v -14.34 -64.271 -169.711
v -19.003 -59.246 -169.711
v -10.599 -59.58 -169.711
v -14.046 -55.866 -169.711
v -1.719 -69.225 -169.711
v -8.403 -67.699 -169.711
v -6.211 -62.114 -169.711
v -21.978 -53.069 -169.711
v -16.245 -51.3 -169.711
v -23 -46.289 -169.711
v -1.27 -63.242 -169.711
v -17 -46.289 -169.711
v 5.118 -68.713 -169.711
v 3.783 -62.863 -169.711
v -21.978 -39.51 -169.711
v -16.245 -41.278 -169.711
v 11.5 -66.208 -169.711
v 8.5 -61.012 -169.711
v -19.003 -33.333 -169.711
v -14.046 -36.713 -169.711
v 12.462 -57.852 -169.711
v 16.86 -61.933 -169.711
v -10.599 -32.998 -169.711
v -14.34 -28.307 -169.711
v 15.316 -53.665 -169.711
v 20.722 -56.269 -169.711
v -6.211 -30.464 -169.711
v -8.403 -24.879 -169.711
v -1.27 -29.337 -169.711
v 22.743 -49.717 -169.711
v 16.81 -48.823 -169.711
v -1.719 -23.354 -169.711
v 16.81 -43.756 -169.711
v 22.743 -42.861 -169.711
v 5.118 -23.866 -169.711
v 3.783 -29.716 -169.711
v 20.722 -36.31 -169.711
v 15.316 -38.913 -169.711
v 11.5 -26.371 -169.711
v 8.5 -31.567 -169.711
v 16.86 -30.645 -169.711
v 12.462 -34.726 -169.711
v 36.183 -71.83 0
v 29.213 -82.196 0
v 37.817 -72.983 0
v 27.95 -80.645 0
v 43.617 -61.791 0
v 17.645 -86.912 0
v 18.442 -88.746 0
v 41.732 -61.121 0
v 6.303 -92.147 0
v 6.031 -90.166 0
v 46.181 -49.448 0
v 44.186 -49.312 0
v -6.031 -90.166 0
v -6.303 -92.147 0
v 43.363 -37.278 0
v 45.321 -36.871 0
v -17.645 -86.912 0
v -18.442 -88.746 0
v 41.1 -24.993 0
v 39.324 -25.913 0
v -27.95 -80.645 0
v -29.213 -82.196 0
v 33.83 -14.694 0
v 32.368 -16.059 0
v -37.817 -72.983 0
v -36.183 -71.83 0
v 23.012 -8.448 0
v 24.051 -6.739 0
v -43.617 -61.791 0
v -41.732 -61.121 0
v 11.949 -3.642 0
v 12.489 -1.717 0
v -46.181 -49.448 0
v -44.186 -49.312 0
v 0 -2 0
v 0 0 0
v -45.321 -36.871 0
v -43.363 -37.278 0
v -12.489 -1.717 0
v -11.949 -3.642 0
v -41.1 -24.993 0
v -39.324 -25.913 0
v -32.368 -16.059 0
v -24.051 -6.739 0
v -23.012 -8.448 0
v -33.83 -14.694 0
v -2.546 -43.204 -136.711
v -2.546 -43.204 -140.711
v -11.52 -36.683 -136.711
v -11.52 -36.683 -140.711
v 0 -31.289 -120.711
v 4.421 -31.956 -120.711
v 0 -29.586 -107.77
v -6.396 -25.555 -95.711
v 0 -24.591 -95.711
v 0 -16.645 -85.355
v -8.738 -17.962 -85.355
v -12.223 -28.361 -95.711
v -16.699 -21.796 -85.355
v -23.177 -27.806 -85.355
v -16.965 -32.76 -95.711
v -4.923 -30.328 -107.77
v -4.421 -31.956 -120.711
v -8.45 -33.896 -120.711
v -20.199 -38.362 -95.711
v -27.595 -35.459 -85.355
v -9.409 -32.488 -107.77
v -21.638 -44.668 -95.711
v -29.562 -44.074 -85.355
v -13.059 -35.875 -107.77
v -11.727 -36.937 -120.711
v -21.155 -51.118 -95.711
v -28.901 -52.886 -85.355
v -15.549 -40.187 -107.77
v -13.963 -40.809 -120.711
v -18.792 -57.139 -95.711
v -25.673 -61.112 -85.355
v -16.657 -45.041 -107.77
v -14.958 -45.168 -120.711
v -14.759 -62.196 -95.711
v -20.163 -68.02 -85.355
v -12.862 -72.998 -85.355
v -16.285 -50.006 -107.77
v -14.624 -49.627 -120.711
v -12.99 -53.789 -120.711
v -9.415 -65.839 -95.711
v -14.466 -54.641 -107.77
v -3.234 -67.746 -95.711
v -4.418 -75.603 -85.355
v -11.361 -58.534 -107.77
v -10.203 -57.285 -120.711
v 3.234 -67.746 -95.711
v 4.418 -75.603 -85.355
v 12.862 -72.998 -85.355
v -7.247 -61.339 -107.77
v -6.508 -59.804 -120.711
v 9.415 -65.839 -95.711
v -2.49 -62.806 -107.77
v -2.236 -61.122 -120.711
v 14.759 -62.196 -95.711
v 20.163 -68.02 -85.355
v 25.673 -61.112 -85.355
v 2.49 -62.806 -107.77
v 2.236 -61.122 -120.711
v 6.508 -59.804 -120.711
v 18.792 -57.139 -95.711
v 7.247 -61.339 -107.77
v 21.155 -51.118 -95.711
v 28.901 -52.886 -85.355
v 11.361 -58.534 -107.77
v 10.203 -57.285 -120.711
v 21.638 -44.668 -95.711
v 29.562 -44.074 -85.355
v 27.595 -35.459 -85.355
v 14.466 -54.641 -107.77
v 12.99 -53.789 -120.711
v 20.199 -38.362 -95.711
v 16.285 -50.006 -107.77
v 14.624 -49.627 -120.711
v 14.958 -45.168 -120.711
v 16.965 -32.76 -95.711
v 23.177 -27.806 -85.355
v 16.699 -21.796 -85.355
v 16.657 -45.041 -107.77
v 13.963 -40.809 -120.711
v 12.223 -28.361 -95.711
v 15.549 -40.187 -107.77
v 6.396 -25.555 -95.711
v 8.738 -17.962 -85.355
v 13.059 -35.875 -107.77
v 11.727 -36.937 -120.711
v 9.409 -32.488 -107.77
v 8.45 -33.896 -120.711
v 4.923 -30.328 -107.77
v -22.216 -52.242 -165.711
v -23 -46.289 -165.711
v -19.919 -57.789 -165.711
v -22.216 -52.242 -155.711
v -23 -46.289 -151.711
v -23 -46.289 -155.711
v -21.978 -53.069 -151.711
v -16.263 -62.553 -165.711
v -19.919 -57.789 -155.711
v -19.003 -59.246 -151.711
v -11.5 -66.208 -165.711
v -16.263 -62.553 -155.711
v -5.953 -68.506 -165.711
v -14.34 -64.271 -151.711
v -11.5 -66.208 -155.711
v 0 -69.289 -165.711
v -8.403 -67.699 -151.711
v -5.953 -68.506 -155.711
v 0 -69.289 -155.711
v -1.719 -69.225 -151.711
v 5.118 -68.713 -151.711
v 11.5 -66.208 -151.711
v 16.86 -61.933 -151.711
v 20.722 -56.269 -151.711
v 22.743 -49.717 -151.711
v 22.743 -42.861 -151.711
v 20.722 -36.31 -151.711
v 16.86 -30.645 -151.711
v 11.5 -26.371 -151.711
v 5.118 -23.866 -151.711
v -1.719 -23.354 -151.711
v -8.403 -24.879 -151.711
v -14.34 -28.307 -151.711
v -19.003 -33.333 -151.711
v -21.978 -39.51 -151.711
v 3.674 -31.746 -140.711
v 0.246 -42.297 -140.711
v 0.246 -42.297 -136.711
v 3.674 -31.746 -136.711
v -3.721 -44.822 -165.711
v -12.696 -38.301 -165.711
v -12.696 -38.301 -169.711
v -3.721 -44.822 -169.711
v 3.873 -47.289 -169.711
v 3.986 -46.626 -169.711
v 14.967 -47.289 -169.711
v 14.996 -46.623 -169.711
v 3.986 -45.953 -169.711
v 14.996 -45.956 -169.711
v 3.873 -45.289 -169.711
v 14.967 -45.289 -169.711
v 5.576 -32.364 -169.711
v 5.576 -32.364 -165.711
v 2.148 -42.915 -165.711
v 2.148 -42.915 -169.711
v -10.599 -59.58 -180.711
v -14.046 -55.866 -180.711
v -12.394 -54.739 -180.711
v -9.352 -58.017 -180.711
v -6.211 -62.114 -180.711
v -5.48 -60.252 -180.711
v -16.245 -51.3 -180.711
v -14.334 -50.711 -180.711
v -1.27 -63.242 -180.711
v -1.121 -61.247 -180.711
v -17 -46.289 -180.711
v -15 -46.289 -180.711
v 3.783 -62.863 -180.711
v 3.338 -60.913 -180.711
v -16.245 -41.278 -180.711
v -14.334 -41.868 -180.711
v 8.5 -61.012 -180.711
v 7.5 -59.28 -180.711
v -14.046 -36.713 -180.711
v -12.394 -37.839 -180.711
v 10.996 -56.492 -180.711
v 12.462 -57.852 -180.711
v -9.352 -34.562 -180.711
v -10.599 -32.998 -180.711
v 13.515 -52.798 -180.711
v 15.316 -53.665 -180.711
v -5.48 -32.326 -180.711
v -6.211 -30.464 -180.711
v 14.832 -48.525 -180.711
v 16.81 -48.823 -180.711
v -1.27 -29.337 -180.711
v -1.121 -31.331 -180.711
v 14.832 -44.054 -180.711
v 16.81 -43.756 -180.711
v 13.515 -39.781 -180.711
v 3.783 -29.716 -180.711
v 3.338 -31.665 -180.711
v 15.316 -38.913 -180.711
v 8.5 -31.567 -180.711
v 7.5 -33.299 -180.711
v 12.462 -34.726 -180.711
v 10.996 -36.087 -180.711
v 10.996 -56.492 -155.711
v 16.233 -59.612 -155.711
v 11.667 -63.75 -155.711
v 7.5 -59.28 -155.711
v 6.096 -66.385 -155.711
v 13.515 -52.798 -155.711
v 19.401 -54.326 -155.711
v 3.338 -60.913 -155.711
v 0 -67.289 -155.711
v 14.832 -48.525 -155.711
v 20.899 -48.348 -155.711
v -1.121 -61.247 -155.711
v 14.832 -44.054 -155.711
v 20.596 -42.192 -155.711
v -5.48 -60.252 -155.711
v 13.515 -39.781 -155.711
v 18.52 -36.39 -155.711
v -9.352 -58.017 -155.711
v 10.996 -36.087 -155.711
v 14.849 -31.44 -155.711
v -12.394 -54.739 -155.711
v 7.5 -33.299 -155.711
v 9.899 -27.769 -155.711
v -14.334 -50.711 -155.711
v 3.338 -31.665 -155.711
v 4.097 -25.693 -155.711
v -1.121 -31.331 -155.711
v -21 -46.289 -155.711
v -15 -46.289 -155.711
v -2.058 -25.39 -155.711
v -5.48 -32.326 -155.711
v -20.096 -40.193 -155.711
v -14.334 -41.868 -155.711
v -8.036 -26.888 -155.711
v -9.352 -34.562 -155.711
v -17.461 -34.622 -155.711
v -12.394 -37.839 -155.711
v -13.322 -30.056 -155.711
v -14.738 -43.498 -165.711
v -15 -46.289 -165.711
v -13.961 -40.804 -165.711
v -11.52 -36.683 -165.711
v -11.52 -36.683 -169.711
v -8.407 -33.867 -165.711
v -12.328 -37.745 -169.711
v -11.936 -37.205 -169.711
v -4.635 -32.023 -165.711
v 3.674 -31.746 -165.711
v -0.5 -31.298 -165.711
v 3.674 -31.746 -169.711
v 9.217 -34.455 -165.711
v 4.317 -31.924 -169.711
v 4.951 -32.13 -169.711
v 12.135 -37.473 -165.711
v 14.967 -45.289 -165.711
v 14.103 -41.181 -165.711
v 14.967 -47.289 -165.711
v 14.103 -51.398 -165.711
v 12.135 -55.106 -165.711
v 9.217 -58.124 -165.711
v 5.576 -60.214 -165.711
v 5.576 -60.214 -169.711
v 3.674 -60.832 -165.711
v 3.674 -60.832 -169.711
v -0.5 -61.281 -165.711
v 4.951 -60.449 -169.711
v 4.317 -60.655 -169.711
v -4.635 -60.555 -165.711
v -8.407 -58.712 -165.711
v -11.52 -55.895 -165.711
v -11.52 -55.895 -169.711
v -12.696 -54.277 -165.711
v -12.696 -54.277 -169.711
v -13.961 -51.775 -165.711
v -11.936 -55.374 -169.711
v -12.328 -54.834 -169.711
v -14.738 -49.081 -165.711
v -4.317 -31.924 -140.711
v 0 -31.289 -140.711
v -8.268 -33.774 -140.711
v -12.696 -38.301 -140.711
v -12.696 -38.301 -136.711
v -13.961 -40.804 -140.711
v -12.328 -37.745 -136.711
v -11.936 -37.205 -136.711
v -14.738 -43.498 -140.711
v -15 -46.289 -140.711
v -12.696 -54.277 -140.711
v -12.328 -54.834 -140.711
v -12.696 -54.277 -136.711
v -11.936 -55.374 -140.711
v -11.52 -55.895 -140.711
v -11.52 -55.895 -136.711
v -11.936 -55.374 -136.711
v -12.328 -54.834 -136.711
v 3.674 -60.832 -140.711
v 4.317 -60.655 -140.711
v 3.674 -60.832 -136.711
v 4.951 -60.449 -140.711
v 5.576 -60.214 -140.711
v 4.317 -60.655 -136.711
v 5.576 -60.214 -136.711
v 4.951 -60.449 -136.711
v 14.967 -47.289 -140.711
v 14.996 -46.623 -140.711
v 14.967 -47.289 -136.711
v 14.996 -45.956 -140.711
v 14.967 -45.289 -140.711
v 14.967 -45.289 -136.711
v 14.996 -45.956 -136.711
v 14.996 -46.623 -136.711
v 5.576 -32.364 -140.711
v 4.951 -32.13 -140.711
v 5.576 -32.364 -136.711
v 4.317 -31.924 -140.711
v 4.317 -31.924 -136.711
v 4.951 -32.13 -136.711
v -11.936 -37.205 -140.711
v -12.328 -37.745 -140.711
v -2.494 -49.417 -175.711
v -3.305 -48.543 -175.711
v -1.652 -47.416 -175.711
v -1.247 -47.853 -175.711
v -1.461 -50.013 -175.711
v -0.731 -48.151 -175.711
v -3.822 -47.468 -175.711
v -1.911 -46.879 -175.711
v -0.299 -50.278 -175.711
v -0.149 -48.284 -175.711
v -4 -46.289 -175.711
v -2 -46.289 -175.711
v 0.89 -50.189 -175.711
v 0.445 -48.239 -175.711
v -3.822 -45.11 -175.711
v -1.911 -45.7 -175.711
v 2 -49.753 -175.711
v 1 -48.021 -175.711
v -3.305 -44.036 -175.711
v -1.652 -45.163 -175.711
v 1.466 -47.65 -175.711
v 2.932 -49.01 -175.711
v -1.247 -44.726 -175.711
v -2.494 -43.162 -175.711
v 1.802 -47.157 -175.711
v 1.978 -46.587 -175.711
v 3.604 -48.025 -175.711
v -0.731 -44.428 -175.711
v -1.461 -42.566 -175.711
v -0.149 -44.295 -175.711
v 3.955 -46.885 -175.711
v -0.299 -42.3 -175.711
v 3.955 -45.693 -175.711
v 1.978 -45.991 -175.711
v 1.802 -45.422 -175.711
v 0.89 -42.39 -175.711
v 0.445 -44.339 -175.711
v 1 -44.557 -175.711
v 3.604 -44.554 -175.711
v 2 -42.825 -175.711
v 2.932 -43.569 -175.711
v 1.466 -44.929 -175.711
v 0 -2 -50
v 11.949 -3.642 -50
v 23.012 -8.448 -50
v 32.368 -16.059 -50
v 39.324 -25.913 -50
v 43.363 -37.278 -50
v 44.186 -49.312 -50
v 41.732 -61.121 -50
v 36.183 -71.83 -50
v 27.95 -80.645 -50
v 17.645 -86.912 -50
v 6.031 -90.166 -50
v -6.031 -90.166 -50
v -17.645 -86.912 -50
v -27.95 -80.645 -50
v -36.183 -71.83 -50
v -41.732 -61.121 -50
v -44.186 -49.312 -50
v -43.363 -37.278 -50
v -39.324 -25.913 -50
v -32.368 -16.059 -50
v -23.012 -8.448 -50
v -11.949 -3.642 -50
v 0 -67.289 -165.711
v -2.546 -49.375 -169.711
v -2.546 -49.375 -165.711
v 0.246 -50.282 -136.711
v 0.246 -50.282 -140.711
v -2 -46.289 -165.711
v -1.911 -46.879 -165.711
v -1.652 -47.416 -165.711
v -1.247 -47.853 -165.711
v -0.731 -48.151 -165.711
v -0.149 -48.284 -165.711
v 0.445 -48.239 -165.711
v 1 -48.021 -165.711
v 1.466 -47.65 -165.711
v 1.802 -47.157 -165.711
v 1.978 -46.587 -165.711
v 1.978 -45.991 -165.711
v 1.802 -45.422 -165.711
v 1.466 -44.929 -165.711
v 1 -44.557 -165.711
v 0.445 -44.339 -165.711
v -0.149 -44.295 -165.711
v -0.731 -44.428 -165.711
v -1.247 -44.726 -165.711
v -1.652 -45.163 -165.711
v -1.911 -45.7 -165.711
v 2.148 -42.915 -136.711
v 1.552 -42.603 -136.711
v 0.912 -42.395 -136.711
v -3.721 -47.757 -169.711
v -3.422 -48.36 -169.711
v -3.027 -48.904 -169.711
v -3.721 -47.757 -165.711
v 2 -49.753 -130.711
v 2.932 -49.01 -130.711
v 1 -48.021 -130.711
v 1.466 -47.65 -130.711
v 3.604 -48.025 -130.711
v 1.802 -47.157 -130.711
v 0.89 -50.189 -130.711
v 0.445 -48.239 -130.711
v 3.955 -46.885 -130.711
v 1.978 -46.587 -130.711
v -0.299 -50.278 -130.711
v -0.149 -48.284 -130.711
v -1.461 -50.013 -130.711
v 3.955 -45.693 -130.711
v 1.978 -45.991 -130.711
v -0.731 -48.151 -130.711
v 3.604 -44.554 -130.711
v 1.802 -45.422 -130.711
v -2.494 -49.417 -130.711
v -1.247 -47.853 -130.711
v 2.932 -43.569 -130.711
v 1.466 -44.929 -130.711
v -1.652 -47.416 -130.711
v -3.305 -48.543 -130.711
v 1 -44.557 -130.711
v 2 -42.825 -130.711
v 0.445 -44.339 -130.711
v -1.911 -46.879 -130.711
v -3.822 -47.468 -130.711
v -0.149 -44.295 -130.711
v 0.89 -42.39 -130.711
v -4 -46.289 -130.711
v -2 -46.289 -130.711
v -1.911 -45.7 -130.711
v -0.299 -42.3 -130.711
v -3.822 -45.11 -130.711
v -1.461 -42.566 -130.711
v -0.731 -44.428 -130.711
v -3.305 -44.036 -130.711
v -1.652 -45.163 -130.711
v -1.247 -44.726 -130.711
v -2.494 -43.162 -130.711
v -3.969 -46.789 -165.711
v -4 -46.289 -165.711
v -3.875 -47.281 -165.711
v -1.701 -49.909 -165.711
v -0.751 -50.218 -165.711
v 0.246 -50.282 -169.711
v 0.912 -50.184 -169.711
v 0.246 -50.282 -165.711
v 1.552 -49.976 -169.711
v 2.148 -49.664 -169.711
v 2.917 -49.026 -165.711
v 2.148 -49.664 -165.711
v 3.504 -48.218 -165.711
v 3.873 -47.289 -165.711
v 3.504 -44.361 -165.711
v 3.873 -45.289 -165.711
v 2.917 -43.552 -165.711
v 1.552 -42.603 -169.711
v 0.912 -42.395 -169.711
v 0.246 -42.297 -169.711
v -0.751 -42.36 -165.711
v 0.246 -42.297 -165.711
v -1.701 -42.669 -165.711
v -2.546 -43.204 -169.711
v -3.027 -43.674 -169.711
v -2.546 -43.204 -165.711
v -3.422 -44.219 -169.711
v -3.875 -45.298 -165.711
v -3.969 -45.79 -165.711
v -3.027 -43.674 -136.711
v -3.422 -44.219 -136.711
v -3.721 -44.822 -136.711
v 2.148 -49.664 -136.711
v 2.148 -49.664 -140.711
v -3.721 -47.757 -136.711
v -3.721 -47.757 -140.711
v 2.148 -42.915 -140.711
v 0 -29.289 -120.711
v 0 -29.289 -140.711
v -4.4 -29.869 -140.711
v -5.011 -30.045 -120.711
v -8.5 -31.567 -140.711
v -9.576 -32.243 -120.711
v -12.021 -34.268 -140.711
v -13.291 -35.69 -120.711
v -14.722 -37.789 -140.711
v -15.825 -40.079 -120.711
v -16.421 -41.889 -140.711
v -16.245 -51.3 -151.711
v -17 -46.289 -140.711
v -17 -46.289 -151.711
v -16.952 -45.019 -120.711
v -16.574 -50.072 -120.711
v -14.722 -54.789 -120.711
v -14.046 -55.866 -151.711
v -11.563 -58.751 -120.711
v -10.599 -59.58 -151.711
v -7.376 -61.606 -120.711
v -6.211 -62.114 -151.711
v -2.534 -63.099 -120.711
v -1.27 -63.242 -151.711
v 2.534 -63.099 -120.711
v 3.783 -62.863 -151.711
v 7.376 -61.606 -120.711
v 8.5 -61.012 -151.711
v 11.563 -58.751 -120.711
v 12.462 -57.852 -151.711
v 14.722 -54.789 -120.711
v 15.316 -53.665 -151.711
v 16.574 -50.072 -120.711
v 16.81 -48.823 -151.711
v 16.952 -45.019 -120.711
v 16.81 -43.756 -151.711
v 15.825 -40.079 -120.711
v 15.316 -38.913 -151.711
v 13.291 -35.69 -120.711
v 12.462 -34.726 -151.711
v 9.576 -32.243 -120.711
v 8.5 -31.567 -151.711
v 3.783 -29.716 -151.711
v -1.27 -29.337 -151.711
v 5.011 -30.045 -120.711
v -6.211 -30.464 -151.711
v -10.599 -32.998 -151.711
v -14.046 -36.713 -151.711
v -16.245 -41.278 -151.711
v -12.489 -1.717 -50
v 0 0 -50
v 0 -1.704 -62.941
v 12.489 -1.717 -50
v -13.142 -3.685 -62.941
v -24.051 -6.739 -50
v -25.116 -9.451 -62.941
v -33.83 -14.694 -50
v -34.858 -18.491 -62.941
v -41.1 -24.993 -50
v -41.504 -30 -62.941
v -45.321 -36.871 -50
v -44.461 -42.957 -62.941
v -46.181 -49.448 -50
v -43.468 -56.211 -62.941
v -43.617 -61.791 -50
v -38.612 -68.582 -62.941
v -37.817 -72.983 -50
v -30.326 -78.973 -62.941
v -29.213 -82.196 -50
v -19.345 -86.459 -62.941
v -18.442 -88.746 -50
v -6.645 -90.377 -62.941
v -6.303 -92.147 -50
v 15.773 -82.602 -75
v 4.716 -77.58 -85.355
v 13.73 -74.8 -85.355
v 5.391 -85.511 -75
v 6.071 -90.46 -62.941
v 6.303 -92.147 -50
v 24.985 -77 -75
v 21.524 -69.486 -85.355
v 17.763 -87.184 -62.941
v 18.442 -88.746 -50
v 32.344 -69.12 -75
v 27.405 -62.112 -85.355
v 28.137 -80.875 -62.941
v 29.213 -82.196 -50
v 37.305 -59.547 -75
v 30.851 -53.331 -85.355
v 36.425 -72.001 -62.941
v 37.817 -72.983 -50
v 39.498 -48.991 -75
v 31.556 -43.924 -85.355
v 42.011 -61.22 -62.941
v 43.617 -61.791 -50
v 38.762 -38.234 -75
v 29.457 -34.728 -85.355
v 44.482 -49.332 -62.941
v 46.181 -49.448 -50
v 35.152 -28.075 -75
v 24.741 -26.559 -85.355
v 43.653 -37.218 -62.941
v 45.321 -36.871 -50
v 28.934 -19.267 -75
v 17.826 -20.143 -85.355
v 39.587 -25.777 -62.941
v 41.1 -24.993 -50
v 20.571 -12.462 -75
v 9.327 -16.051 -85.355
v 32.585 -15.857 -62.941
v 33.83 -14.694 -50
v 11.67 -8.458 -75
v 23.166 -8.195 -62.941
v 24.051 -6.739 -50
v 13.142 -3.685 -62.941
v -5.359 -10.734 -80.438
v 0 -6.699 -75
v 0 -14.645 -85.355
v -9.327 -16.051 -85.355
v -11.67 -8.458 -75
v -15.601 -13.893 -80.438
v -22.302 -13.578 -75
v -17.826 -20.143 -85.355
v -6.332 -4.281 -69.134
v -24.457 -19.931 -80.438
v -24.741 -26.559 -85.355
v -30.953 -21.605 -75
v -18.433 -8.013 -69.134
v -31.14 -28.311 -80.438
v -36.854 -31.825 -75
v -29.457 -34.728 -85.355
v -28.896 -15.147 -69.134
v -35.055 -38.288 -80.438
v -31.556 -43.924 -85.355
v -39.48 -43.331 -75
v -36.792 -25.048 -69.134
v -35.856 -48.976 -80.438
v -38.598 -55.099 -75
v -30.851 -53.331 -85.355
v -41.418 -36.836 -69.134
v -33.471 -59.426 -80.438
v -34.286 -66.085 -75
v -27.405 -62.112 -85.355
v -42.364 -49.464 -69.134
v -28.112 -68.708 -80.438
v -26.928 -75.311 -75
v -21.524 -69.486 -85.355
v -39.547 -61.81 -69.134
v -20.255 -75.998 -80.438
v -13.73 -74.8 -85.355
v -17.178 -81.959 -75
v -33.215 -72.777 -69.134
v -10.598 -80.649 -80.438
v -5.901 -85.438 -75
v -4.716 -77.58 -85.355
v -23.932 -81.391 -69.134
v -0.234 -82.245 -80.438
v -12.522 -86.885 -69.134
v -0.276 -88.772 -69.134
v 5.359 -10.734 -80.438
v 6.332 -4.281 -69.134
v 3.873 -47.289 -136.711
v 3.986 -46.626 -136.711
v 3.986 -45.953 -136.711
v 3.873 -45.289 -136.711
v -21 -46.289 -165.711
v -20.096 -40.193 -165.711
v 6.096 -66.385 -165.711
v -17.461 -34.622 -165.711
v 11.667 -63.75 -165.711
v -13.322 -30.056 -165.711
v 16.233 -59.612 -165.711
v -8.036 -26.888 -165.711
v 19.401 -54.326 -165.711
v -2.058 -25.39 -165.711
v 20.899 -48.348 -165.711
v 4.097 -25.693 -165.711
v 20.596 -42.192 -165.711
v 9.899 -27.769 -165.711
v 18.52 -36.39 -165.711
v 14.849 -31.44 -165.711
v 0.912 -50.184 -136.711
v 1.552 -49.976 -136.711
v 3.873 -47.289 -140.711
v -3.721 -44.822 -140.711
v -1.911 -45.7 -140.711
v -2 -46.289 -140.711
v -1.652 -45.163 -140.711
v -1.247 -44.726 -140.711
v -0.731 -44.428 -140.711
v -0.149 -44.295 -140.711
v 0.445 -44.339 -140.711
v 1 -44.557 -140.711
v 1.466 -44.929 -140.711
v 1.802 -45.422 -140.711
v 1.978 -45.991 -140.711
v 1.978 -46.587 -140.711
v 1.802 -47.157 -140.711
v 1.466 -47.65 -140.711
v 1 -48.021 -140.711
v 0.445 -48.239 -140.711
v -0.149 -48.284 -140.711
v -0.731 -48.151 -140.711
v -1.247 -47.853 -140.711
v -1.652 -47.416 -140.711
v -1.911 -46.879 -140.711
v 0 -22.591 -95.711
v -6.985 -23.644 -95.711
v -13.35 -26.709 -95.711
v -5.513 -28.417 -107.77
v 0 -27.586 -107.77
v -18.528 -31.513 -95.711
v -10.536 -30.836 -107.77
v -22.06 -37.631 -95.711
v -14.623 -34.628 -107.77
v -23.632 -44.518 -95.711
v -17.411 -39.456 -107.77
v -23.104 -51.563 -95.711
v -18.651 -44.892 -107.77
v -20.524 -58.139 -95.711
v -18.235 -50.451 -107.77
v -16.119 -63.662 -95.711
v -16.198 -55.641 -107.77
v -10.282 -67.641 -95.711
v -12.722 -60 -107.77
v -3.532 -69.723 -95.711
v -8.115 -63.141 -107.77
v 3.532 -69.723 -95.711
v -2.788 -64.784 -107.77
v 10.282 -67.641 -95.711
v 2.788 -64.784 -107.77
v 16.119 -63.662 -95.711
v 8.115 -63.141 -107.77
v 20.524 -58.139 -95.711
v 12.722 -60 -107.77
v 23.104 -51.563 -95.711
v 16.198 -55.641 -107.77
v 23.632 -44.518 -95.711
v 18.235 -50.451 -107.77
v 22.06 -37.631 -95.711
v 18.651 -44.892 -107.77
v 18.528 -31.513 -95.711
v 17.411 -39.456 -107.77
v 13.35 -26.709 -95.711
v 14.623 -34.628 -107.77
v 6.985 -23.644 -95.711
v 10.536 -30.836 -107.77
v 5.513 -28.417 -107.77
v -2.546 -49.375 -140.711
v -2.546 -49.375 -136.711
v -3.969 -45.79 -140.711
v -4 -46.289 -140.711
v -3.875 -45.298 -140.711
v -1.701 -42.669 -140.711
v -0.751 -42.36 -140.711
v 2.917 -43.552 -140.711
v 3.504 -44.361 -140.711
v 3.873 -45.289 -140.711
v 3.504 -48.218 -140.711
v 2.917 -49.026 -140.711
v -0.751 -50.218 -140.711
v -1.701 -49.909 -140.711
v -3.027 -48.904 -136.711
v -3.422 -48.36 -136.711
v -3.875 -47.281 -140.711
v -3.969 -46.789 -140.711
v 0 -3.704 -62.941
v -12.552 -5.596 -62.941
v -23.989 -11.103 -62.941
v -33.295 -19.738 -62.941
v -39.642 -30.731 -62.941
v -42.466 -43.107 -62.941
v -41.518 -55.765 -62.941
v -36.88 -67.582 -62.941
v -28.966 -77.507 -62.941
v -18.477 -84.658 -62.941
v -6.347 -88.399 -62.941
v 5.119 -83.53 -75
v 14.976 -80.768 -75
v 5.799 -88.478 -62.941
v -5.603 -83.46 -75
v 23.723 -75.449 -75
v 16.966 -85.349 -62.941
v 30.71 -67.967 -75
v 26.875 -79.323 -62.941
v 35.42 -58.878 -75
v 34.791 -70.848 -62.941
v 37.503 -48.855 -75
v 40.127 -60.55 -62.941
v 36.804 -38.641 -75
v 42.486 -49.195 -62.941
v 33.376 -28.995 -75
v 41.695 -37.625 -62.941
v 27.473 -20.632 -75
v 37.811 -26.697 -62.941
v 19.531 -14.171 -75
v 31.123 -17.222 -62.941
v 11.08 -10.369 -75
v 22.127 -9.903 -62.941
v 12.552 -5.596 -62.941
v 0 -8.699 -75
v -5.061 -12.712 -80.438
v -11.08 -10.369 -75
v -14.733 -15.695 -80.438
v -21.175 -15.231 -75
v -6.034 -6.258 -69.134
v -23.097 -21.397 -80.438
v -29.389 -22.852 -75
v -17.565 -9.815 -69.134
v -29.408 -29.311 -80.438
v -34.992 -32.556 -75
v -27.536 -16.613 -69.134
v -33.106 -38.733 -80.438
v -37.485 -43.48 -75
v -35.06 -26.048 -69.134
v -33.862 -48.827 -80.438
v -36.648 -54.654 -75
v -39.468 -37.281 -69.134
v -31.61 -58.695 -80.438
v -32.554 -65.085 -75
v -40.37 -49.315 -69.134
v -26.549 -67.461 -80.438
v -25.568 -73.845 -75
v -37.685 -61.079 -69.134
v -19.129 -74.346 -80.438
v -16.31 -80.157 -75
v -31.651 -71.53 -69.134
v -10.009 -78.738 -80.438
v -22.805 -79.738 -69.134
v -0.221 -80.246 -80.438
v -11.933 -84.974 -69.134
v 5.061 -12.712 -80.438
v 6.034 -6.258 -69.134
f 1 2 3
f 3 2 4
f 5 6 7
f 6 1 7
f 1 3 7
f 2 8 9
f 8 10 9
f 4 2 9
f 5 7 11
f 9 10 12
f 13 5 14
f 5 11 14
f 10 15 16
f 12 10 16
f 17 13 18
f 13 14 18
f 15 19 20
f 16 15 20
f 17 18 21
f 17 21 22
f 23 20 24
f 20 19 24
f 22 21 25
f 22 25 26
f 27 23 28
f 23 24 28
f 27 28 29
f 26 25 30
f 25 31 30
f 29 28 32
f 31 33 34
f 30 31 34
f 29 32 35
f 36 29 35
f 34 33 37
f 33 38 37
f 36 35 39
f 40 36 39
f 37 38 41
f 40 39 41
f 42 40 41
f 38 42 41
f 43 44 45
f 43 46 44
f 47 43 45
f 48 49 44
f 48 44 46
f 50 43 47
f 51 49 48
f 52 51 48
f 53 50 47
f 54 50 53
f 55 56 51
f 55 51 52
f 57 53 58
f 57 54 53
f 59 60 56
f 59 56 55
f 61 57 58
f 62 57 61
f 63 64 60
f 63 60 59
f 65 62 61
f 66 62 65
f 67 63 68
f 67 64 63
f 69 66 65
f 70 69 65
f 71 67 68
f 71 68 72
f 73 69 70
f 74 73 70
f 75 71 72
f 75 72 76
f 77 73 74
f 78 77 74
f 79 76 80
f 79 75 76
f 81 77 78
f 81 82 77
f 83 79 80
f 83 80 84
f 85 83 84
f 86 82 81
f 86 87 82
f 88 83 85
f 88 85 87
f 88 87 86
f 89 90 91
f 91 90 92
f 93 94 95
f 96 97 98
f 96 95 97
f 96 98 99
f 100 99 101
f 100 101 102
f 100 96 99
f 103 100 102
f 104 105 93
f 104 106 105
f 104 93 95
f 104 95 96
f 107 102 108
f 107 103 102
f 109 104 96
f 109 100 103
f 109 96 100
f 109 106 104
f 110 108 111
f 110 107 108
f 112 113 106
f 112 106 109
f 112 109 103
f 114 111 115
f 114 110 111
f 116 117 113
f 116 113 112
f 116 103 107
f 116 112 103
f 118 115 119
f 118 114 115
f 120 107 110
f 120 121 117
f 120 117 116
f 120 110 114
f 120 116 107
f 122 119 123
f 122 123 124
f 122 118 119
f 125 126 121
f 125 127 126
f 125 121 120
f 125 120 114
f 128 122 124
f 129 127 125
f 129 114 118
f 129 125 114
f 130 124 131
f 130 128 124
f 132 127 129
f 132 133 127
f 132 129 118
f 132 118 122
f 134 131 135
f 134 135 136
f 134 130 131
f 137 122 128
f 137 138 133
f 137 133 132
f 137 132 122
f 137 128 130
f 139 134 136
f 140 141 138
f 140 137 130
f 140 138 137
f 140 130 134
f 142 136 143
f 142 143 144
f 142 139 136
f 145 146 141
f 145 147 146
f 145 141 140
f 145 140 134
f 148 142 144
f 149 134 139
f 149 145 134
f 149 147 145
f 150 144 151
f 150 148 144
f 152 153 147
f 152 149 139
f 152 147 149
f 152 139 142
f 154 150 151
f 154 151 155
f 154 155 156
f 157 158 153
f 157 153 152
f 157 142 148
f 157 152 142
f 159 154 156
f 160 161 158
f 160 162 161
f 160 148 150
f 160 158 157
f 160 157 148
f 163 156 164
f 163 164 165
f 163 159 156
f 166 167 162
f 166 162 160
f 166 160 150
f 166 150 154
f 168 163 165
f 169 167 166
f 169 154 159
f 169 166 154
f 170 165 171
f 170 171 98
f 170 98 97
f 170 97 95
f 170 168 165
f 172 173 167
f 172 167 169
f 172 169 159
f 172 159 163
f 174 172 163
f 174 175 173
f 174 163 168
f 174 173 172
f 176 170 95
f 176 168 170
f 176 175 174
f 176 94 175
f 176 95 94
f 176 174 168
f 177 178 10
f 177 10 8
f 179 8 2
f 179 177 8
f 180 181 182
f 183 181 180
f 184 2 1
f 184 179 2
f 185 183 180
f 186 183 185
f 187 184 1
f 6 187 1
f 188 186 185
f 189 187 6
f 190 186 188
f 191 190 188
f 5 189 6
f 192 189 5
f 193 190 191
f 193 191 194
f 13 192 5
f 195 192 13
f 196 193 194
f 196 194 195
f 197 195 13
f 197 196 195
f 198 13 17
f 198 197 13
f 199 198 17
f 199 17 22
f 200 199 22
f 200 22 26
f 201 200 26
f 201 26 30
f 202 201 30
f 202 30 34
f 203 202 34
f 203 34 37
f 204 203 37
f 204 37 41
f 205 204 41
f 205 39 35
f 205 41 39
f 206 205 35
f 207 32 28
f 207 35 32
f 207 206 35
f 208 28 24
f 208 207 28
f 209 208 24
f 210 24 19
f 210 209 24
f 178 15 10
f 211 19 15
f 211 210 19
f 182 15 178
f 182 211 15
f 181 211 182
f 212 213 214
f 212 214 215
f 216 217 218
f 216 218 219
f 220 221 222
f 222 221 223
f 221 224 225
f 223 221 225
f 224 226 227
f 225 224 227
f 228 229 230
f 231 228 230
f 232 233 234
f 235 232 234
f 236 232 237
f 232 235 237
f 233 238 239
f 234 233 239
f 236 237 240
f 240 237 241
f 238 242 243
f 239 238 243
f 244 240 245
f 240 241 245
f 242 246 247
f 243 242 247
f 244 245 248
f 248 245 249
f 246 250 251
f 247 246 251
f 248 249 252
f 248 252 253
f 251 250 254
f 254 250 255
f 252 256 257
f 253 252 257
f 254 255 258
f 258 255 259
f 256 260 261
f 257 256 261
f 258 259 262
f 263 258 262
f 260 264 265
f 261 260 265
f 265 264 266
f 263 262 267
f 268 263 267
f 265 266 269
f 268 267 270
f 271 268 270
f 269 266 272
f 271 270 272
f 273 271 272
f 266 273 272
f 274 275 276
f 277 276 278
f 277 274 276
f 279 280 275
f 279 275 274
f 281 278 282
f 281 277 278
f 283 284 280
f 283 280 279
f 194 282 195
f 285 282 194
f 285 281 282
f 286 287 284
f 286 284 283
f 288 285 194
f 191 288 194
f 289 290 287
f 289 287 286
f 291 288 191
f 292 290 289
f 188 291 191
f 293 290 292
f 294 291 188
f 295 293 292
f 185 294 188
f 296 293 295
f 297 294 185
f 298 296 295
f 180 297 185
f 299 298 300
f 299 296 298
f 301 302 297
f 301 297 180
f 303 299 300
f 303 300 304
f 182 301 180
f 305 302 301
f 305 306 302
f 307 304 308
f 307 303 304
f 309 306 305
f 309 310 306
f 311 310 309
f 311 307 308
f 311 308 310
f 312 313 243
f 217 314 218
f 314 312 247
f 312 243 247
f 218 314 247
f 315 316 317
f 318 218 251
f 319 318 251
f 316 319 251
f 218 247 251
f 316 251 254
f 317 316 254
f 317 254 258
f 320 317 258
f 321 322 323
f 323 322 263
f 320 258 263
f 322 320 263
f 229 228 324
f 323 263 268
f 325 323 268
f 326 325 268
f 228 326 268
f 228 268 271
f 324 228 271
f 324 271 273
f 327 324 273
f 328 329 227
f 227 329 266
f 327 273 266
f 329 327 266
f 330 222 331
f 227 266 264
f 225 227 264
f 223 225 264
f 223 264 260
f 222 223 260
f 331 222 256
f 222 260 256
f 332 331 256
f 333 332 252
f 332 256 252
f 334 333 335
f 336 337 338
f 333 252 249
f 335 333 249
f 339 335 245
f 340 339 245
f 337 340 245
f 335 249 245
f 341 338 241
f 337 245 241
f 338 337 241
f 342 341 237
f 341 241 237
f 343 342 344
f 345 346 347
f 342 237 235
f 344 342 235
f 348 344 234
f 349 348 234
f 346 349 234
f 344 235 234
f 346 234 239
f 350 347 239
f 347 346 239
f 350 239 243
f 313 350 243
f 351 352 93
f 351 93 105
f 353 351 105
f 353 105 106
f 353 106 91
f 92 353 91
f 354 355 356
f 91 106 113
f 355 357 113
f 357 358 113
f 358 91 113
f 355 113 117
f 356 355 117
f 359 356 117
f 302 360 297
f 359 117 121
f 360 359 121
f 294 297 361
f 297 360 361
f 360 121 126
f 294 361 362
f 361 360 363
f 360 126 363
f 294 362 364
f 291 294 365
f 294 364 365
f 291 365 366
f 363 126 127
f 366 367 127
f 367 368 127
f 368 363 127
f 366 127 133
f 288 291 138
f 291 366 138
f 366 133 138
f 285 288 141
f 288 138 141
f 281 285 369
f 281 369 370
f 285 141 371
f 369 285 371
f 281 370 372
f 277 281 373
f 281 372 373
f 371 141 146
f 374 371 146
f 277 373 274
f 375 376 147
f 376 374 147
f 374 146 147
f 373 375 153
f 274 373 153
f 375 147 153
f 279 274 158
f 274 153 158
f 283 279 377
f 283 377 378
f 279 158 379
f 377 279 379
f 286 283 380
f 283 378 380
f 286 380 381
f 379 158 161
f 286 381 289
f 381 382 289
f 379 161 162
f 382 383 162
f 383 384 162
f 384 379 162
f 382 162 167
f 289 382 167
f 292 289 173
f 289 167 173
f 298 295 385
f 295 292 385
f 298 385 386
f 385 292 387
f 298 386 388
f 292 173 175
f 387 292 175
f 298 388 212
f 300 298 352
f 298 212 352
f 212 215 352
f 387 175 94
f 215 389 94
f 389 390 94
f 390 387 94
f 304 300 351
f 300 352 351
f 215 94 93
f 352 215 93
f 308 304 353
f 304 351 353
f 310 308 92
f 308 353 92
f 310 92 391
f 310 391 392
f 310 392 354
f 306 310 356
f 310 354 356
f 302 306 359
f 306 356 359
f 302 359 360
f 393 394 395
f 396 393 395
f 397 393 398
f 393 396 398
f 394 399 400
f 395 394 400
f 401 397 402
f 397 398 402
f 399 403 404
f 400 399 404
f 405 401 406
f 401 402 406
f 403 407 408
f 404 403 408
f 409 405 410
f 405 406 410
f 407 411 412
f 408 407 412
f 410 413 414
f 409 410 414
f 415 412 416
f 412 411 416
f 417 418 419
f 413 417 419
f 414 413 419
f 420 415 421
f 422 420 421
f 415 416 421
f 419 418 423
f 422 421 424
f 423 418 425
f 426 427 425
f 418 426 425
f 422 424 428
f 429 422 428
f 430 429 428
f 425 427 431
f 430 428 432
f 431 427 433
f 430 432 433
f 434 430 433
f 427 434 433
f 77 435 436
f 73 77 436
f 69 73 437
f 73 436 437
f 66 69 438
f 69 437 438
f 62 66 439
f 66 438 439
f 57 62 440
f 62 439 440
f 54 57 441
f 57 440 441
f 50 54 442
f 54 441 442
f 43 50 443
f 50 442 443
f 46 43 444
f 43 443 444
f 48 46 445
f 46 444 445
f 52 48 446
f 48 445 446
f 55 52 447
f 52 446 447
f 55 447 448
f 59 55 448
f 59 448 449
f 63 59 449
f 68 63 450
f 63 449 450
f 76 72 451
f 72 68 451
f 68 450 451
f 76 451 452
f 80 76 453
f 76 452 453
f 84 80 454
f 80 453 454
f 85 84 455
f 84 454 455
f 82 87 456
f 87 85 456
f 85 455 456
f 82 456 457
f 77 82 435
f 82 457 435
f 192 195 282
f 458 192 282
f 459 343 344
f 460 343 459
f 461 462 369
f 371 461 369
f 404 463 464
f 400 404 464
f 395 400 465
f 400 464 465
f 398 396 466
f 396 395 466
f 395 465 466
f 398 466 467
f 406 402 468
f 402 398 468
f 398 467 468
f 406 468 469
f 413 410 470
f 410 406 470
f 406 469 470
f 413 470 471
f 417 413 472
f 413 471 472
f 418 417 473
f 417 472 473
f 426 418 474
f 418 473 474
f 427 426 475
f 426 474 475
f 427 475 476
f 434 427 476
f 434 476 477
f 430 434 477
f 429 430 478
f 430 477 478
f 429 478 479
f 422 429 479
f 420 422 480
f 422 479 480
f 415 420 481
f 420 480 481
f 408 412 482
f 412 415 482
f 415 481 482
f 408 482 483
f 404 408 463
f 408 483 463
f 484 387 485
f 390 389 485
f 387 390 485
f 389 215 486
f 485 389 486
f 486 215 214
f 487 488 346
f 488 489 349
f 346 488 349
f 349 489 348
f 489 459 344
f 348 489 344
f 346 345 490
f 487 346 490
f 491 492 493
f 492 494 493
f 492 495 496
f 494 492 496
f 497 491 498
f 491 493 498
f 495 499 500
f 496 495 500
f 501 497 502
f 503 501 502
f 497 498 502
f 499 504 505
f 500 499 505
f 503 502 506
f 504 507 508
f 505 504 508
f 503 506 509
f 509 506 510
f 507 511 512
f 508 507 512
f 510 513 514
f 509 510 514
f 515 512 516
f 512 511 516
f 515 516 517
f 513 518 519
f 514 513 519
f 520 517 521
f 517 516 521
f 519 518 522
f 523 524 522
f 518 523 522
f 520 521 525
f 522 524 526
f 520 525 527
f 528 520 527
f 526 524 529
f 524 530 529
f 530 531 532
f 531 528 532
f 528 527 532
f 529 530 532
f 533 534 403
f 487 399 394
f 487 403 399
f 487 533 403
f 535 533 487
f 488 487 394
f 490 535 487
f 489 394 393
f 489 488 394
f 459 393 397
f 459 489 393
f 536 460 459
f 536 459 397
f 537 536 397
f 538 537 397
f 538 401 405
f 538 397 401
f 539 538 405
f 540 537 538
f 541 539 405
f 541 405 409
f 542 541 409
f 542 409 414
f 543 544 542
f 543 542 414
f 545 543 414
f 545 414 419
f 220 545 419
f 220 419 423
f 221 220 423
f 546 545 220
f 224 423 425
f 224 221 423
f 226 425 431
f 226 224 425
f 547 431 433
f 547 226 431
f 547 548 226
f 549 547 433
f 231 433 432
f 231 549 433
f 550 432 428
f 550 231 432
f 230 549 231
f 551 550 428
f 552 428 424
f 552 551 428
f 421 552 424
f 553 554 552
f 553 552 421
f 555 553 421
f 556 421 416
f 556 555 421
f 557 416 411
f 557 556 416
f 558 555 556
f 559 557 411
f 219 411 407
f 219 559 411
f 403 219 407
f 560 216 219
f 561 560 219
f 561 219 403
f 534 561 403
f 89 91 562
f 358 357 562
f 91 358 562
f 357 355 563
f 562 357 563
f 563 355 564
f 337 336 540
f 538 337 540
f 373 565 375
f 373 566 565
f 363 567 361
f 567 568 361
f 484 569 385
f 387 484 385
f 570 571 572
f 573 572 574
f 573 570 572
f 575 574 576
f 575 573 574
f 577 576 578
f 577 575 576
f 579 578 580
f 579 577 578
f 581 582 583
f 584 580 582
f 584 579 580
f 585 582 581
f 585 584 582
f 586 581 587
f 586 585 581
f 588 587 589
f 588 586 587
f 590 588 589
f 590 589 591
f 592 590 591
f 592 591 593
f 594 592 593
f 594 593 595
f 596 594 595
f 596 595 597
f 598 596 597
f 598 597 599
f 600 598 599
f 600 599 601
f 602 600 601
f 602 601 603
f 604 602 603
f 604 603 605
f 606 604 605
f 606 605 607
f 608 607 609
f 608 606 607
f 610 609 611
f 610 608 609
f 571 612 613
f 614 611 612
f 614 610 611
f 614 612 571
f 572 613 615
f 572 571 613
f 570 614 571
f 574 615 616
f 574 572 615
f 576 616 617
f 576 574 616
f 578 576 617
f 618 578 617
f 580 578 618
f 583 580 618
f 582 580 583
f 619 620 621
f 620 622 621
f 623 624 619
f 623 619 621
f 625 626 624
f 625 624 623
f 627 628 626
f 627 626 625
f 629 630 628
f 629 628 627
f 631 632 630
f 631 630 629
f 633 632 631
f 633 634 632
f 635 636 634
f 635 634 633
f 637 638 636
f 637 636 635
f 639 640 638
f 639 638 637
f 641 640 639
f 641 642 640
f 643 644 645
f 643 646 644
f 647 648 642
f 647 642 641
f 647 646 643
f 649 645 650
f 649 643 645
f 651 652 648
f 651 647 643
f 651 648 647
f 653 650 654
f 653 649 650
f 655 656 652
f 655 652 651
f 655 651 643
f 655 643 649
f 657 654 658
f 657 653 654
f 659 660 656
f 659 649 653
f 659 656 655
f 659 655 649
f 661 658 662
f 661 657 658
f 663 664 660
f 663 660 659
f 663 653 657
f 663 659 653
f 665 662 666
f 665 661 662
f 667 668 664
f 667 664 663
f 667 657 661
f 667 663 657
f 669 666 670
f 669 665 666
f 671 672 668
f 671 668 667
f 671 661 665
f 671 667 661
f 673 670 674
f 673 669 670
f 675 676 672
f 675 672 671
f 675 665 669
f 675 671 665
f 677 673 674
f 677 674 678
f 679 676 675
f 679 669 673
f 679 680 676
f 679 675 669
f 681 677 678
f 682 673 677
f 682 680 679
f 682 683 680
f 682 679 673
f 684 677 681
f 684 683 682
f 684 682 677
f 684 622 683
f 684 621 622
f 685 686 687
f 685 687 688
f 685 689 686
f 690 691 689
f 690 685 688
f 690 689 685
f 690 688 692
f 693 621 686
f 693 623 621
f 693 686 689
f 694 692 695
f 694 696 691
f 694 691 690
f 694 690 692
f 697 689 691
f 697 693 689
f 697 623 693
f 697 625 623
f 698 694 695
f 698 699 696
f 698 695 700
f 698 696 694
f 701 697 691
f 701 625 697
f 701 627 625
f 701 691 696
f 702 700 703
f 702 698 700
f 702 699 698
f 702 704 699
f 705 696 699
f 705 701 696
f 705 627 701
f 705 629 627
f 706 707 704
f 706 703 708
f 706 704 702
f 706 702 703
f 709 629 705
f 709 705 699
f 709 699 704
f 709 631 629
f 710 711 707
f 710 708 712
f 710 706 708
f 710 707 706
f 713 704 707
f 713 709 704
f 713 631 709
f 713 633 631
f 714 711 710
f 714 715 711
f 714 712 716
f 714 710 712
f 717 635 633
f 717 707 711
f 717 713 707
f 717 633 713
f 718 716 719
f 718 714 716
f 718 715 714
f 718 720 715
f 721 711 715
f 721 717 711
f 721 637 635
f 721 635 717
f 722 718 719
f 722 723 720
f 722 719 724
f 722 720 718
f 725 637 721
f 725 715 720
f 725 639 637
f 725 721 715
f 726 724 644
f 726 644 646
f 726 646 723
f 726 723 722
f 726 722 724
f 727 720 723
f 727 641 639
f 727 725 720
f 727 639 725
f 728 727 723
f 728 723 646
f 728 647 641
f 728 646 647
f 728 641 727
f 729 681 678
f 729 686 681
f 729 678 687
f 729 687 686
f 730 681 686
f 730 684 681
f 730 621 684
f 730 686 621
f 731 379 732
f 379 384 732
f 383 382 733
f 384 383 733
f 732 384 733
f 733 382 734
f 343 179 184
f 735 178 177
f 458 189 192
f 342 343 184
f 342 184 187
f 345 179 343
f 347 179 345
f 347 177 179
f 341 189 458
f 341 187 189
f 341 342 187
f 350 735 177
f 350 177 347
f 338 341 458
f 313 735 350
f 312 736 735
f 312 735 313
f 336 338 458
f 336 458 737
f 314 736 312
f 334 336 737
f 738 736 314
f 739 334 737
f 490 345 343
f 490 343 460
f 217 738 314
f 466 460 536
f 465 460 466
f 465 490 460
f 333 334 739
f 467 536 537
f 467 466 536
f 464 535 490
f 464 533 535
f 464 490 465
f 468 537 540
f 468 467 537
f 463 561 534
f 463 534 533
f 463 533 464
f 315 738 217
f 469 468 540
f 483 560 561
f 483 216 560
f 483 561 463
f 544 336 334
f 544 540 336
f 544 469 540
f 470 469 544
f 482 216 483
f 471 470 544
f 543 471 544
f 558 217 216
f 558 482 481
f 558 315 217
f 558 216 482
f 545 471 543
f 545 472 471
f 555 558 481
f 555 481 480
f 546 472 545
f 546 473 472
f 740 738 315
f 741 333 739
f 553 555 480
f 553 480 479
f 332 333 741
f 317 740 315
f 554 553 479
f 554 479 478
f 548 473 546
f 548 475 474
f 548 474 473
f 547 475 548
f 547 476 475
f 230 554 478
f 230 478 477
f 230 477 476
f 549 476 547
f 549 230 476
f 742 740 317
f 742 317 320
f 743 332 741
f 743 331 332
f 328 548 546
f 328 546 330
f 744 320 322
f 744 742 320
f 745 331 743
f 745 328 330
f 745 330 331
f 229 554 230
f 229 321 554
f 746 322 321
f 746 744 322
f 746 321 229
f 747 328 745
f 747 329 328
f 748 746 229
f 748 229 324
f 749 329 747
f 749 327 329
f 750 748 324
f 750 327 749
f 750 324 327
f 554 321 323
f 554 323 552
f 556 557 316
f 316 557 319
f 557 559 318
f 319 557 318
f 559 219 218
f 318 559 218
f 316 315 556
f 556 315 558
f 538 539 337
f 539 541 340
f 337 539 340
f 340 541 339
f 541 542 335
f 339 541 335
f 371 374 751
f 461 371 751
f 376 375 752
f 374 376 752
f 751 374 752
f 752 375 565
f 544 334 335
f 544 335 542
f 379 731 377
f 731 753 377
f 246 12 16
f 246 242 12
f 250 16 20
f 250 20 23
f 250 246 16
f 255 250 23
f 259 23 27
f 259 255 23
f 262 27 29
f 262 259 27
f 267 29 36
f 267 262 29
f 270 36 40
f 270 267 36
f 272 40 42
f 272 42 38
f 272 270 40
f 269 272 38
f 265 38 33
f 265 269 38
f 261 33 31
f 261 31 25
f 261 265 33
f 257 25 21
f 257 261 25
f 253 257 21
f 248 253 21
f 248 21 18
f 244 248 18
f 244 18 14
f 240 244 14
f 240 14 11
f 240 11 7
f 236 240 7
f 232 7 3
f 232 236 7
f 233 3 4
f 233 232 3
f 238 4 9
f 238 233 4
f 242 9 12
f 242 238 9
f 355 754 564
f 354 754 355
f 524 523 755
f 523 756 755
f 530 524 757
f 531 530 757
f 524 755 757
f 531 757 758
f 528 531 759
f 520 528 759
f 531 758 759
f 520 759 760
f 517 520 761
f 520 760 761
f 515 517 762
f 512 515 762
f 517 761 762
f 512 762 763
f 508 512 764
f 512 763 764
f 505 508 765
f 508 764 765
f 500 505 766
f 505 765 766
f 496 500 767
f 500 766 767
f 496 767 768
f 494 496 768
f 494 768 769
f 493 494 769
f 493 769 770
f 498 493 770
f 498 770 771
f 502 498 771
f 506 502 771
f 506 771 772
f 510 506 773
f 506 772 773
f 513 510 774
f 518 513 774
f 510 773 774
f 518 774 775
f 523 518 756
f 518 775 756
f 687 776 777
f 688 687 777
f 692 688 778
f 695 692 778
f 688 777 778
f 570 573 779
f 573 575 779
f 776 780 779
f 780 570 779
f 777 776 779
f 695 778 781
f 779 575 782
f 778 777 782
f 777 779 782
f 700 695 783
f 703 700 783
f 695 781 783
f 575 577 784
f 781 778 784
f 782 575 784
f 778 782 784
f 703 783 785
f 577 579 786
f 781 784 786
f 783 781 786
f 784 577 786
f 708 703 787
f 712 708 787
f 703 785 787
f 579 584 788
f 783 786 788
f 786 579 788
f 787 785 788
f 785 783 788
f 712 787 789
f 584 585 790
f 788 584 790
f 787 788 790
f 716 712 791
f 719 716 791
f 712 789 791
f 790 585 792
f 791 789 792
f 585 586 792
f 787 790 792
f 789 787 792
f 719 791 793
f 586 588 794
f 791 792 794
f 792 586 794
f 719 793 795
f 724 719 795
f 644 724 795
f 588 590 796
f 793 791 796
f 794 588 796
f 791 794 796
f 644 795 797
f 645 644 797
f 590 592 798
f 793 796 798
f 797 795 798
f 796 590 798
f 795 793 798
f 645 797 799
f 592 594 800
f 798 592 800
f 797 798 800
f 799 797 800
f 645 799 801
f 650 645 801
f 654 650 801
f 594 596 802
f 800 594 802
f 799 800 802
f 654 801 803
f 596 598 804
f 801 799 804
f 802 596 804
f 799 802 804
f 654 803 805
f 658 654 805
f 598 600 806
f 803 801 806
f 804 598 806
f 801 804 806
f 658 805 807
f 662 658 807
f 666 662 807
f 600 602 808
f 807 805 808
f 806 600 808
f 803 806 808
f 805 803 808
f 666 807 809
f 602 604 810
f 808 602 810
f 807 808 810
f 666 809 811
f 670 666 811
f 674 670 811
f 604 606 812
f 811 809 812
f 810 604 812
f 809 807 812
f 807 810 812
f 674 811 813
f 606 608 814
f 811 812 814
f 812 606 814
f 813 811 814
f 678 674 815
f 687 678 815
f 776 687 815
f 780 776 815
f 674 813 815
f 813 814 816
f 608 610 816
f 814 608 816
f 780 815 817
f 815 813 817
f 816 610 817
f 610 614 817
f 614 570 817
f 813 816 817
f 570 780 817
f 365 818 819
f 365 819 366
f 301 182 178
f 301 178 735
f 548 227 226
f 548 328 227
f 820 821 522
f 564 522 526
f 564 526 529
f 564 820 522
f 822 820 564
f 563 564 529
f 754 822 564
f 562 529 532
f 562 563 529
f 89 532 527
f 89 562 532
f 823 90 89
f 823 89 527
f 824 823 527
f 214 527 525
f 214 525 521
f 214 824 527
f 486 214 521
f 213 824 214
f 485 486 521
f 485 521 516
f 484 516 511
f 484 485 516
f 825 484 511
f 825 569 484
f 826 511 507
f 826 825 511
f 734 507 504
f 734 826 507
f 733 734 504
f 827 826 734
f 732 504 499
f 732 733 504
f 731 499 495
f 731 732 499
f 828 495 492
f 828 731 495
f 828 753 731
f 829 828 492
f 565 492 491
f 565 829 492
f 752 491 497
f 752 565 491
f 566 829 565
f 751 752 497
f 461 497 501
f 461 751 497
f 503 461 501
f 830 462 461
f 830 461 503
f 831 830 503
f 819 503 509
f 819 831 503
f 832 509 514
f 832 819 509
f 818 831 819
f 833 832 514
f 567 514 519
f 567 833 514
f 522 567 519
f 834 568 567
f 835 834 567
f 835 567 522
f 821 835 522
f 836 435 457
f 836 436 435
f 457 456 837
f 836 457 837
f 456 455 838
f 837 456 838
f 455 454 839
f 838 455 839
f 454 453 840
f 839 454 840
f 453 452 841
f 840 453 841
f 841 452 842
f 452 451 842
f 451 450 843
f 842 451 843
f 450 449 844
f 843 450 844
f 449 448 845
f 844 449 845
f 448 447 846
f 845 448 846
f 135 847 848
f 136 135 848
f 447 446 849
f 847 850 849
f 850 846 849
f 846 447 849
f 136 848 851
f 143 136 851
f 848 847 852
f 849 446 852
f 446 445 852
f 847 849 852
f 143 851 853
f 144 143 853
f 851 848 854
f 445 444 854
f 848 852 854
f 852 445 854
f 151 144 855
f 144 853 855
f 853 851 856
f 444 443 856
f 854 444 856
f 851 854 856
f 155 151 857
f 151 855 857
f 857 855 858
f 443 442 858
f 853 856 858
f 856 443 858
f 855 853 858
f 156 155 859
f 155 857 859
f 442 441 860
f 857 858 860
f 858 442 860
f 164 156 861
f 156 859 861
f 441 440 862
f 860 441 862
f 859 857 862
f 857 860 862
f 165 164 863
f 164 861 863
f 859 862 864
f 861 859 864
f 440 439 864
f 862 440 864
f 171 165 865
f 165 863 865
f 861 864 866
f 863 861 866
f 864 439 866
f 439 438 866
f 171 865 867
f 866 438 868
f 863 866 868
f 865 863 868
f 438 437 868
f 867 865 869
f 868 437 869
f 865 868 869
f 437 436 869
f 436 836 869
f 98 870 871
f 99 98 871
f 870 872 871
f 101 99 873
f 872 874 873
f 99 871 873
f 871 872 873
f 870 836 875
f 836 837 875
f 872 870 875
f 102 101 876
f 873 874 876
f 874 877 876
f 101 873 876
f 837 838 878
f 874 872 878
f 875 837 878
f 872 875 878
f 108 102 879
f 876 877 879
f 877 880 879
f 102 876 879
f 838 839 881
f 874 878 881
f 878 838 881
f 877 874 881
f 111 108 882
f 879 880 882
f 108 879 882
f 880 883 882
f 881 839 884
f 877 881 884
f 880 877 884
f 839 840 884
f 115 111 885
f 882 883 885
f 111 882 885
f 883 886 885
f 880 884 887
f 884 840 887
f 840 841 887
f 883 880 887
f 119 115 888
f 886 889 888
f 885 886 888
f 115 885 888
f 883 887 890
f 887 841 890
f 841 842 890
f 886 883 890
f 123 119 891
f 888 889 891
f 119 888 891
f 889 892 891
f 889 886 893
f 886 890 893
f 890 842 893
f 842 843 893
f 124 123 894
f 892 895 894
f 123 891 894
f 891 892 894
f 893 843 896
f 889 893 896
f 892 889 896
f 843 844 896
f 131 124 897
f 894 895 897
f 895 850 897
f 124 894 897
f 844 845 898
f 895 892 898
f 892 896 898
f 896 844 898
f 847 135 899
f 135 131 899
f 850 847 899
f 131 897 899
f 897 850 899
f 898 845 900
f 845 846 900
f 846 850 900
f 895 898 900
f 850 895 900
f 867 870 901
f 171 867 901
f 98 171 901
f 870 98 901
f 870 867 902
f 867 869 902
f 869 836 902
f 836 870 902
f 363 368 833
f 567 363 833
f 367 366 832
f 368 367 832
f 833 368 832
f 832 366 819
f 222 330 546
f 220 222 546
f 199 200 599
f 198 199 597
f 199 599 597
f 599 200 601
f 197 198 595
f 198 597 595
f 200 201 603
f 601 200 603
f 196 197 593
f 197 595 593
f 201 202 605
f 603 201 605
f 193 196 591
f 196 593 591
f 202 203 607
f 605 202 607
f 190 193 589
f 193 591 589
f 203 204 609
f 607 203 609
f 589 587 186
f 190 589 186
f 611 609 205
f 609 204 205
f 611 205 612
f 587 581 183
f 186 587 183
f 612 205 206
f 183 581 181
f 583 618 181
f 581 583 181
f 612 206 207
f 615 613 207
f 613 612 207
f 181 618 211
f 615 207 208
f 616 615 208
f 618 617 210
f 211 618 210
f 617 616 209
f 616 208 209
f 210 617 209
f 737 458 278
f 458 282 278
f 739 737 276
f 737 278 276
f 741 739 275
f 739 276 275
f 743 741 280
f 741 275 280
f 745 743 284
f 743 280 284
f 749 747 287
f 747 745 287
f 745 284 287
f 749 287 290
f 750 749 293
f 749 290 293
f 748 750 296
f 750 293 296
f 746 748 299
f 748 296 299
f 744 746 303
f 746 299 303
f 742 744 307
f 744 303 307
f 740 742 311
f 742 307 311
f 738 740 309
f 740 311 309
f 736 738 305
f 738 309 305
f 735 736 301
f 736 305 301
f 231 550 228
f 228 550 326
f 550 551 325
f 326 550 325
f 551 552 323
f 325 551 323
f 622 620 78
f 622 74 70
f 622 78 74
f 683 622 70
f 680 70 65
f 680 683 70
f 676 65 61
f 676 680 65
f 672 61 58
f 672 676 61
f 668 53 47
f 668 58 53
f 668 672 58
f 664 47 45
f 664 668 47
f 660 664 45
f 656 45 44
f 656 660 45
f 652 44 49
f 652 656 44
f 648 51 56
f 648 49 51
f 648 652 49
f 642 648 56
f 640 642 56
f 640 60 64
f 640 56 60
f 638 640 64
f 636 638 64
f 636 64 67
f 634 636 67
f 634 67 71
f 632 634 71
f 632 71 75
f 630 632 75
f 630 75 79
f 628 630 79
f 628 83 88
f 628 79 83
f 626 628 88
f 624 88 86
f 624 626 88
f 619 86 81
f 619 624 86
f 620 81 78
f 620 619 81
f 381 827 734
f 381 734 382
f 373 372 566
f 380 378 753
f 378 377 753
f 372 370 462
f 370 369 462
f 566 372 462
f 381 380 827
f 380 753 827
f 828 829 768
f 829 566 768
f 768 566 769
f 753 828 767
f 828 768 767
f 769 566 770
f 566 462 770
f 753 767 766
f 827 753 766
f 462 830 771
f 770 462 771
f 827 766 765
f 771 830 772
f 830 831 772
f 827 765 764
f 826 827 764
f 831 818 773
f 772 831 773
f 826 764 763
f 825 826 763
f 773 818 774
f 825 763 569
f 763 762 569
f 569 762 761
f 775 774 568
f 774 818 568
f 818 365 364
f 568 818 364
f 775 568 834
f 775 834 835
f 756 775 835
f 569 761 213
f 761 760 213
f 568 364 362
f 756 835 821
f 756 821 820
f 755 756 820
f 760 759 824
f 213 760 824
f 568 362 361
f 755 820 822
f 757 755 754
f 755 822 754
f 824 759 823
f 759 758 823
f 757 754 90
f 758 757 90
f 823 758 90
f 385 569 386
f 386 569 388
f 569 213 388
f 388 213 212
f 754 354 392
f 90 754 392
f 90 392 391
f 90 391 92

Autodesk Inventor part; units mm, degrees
ref_plane "YZ Plane" through (0, 0, 0) normal (1, 0, 0) x (0, 1, 0)
sketch "Sketch2" plane through (0, 0, 0) normal (1, 0, 0) x (0, 1, 0)
  line L0 (0, 0) -> (0, -50)
  arc A0 (-14.6447, -85.3553) -> (0, -50) centre (-50, -50) ccw
  line L1 (-50, -50) -> (-14.6447, -85.3553) construction
  line L2 (-50, -50) -> (0, -50) construction
  arc A1 (-14.6447, -85.3553) -> (-29.2893, -120.7107) centre (20.7107, -120.7107) ccw
  line L3 (20.7107, -120.7107) -> (-29.2893, -120.7107) construction
  line L4 (20.7107, -120.7107) -> (-14.6447, -85.3553) construction
  line L5 (-29.2893, -120.7107) -> (-29.2893, -140.7107)
  line L6 (0, 0) -> (-92.5786, 0) construction
  line L7 (-2, 0) -> (-2, -50)
  arc A2 (-16.6447, -85.3553) -> (-2, -50) centre (-52, -50) ccw
  arc A3 (-16.6447, -85.3553) -> (-31.2893, -120.7107) centre (18.7107, -120.7107) ccw
  line L8 (-31.2893, -120.7107) -> (-31.2893, -140.7107)
  line L9 (0, 0) -> (-2, 0)
  line L10 (-29.2893, -140.7107) -> (-31.2893, -140.7107)
  line L11 (-46.2893, -140.7107) -> (-46.2893, 0)
  line L12 (-31.2893, -140.7107) -> (-46.2893, -140.7107) construction
  dimension "d18" = 50
  dimension "d19" = 45
  dimension "d20" = 45
  dimension "d21" = 50
  dimension "d22" = 50
  dimension "d23" = 20
  dimension "d26" = 2
  dimension "d31" = 90
  dimension "d32" = 15
revolve "Revolution1" add sketch "Sketch2" angle 360 about axis through (0, -46.2893, -140.7107) along (0, 0, 1)
sketch "Sketch3" plane through (0, -46.2893, -140.7107) normal (0, 0, -1) x (-1, 0, 0)
  circle A0 centre (0, 0) radius 15 projected
  circle A1 centre (0, 0) radius 2
  circle A2 centre (0, 0) radius 4
  point P0 (0, 46.2893)
  dimension "d34" = 4
  dimension "d35" = 8
extrude "Extrusion1" add sketch "Sketch3" against normal blind 10 contours A2
sketch "Sketch4" plane through (0, -46.2893, -140.7107) normal (0, 0, -1) x (-1, 0, 0)
  circle A0 centre (0, 0) radius 15 projected
  circle A1 centre (0, 0) radius 4 projected
  line L0 (-3.873, -1) -> (-14.9666, -1)
  line L1 (-3.873, 1) -> (-14.9666, 1)
  circle A2 centre (0, 0) radius 15 projected
  line L2 (-4, 0) -> (-15, 0) construction
  line L3 (64.8051, 46.2893) -> (-64.8051, 46.2893) projected
  point P0 (0, 46.2893)
  dimension "d38" = 0
  dimension "d39" = 1
  dimension "d40" = 1
extrude "Extrusion2" add sketch "Sketch4" against normal blind 4 contours L1 A1 L0 A0 picked at (-7.656, -0.1112)
pattern_circular "Circular Pattern1" count 5 over 360 about axis through (0, -46.2893, -140.7107) along (0, 0, 1) of "Extrusion2"
sketch "Sketch5" plane through (0, -46.2893, -140.7107) normal (0, 0, -1) x (-1, 0, 0)
  circle A0 centre (0, 0) radius 17 projected
  circle A1 centre (0, 0) radius 15
  point P0 (0, 46.2893)
  dimension "d46" = 30
extrude "Extrusion3" add sketch "Sketch5" along normal blind 15
sketch "Sketch6" plane through (0, -46.2893, -155.7107) normal (0, 0, -1) x (-1, 0, 0)
  circle A0 centre (0, 0) radius 17 projected
  circle A1 centre (0, 0) radius 23
  point P0 (0, 46.2893)
  dimension "d49" = 46
extrude "Extrusion4" add sketch "Sketch6" against normal blind 4
sketch "Sketch7" plane through (0, -46.2893, -155.7107) normal (0, 0, -1) x (-1, 0, 0)
  circle A0 centre (0, 0) radius 23 projected
  circle A1 centre (0, 0) radius 21
  point P0 (0, 46.2893)
  dimension "d52" = 42
extrude "Extrusion5" add sketch "Sketch7" along normal blind 10
sketch "Sketch8" plane through (0, -46.2893, -165.7107) normal (0, 0, -1) x (-1, 0, 0)
  circle A0 centre (0, 0) radius 21 projected
  circle A1 centre (0, 0) radius 23 projected
  circle A2 centre (0, 0) radius 23 projected
  line L0 (0, -23) -> (0, -21)
  line L1 (23, 0) -> (21, 0)
  line L2 (64.8051, 46.2893) -> (-64.8051, 46.2893) projected
  line L3 (0, -64.8051) -> (0, 64.8051) projected
  point P0 (0, 46.2893)
  dimension "d55" = 2
  dimension "d56" = 2
extrude "Extrusion6" cut sketch "Sketch8" against normal blind 10 contours A0 L1 A1 L0
ref_plane "Mirror plane" through (14.9666, -47.2893, -153.2107) normal (0, 0, -1) x (-1, 0, 0)
mirror "Mirror1" about plane through (14.9666, -47.2893, -153.2107) normal (0, 0, -1) of "Extrusion2", "Circular Pattern1", "Extrusion1"
ref_plane "Mirror plane 2" through (0, -46.2893, -160.7107) normal (0, 0, -1) x (-1, 0, 0)
mirror "Mirror2" about plane through (0, -46.2893, -160.7107) normal (0, 0, -1) of "Extrusion4", "Extrusion3"
equation "\"d40\" = d39"
properties part number "Outer tube"
